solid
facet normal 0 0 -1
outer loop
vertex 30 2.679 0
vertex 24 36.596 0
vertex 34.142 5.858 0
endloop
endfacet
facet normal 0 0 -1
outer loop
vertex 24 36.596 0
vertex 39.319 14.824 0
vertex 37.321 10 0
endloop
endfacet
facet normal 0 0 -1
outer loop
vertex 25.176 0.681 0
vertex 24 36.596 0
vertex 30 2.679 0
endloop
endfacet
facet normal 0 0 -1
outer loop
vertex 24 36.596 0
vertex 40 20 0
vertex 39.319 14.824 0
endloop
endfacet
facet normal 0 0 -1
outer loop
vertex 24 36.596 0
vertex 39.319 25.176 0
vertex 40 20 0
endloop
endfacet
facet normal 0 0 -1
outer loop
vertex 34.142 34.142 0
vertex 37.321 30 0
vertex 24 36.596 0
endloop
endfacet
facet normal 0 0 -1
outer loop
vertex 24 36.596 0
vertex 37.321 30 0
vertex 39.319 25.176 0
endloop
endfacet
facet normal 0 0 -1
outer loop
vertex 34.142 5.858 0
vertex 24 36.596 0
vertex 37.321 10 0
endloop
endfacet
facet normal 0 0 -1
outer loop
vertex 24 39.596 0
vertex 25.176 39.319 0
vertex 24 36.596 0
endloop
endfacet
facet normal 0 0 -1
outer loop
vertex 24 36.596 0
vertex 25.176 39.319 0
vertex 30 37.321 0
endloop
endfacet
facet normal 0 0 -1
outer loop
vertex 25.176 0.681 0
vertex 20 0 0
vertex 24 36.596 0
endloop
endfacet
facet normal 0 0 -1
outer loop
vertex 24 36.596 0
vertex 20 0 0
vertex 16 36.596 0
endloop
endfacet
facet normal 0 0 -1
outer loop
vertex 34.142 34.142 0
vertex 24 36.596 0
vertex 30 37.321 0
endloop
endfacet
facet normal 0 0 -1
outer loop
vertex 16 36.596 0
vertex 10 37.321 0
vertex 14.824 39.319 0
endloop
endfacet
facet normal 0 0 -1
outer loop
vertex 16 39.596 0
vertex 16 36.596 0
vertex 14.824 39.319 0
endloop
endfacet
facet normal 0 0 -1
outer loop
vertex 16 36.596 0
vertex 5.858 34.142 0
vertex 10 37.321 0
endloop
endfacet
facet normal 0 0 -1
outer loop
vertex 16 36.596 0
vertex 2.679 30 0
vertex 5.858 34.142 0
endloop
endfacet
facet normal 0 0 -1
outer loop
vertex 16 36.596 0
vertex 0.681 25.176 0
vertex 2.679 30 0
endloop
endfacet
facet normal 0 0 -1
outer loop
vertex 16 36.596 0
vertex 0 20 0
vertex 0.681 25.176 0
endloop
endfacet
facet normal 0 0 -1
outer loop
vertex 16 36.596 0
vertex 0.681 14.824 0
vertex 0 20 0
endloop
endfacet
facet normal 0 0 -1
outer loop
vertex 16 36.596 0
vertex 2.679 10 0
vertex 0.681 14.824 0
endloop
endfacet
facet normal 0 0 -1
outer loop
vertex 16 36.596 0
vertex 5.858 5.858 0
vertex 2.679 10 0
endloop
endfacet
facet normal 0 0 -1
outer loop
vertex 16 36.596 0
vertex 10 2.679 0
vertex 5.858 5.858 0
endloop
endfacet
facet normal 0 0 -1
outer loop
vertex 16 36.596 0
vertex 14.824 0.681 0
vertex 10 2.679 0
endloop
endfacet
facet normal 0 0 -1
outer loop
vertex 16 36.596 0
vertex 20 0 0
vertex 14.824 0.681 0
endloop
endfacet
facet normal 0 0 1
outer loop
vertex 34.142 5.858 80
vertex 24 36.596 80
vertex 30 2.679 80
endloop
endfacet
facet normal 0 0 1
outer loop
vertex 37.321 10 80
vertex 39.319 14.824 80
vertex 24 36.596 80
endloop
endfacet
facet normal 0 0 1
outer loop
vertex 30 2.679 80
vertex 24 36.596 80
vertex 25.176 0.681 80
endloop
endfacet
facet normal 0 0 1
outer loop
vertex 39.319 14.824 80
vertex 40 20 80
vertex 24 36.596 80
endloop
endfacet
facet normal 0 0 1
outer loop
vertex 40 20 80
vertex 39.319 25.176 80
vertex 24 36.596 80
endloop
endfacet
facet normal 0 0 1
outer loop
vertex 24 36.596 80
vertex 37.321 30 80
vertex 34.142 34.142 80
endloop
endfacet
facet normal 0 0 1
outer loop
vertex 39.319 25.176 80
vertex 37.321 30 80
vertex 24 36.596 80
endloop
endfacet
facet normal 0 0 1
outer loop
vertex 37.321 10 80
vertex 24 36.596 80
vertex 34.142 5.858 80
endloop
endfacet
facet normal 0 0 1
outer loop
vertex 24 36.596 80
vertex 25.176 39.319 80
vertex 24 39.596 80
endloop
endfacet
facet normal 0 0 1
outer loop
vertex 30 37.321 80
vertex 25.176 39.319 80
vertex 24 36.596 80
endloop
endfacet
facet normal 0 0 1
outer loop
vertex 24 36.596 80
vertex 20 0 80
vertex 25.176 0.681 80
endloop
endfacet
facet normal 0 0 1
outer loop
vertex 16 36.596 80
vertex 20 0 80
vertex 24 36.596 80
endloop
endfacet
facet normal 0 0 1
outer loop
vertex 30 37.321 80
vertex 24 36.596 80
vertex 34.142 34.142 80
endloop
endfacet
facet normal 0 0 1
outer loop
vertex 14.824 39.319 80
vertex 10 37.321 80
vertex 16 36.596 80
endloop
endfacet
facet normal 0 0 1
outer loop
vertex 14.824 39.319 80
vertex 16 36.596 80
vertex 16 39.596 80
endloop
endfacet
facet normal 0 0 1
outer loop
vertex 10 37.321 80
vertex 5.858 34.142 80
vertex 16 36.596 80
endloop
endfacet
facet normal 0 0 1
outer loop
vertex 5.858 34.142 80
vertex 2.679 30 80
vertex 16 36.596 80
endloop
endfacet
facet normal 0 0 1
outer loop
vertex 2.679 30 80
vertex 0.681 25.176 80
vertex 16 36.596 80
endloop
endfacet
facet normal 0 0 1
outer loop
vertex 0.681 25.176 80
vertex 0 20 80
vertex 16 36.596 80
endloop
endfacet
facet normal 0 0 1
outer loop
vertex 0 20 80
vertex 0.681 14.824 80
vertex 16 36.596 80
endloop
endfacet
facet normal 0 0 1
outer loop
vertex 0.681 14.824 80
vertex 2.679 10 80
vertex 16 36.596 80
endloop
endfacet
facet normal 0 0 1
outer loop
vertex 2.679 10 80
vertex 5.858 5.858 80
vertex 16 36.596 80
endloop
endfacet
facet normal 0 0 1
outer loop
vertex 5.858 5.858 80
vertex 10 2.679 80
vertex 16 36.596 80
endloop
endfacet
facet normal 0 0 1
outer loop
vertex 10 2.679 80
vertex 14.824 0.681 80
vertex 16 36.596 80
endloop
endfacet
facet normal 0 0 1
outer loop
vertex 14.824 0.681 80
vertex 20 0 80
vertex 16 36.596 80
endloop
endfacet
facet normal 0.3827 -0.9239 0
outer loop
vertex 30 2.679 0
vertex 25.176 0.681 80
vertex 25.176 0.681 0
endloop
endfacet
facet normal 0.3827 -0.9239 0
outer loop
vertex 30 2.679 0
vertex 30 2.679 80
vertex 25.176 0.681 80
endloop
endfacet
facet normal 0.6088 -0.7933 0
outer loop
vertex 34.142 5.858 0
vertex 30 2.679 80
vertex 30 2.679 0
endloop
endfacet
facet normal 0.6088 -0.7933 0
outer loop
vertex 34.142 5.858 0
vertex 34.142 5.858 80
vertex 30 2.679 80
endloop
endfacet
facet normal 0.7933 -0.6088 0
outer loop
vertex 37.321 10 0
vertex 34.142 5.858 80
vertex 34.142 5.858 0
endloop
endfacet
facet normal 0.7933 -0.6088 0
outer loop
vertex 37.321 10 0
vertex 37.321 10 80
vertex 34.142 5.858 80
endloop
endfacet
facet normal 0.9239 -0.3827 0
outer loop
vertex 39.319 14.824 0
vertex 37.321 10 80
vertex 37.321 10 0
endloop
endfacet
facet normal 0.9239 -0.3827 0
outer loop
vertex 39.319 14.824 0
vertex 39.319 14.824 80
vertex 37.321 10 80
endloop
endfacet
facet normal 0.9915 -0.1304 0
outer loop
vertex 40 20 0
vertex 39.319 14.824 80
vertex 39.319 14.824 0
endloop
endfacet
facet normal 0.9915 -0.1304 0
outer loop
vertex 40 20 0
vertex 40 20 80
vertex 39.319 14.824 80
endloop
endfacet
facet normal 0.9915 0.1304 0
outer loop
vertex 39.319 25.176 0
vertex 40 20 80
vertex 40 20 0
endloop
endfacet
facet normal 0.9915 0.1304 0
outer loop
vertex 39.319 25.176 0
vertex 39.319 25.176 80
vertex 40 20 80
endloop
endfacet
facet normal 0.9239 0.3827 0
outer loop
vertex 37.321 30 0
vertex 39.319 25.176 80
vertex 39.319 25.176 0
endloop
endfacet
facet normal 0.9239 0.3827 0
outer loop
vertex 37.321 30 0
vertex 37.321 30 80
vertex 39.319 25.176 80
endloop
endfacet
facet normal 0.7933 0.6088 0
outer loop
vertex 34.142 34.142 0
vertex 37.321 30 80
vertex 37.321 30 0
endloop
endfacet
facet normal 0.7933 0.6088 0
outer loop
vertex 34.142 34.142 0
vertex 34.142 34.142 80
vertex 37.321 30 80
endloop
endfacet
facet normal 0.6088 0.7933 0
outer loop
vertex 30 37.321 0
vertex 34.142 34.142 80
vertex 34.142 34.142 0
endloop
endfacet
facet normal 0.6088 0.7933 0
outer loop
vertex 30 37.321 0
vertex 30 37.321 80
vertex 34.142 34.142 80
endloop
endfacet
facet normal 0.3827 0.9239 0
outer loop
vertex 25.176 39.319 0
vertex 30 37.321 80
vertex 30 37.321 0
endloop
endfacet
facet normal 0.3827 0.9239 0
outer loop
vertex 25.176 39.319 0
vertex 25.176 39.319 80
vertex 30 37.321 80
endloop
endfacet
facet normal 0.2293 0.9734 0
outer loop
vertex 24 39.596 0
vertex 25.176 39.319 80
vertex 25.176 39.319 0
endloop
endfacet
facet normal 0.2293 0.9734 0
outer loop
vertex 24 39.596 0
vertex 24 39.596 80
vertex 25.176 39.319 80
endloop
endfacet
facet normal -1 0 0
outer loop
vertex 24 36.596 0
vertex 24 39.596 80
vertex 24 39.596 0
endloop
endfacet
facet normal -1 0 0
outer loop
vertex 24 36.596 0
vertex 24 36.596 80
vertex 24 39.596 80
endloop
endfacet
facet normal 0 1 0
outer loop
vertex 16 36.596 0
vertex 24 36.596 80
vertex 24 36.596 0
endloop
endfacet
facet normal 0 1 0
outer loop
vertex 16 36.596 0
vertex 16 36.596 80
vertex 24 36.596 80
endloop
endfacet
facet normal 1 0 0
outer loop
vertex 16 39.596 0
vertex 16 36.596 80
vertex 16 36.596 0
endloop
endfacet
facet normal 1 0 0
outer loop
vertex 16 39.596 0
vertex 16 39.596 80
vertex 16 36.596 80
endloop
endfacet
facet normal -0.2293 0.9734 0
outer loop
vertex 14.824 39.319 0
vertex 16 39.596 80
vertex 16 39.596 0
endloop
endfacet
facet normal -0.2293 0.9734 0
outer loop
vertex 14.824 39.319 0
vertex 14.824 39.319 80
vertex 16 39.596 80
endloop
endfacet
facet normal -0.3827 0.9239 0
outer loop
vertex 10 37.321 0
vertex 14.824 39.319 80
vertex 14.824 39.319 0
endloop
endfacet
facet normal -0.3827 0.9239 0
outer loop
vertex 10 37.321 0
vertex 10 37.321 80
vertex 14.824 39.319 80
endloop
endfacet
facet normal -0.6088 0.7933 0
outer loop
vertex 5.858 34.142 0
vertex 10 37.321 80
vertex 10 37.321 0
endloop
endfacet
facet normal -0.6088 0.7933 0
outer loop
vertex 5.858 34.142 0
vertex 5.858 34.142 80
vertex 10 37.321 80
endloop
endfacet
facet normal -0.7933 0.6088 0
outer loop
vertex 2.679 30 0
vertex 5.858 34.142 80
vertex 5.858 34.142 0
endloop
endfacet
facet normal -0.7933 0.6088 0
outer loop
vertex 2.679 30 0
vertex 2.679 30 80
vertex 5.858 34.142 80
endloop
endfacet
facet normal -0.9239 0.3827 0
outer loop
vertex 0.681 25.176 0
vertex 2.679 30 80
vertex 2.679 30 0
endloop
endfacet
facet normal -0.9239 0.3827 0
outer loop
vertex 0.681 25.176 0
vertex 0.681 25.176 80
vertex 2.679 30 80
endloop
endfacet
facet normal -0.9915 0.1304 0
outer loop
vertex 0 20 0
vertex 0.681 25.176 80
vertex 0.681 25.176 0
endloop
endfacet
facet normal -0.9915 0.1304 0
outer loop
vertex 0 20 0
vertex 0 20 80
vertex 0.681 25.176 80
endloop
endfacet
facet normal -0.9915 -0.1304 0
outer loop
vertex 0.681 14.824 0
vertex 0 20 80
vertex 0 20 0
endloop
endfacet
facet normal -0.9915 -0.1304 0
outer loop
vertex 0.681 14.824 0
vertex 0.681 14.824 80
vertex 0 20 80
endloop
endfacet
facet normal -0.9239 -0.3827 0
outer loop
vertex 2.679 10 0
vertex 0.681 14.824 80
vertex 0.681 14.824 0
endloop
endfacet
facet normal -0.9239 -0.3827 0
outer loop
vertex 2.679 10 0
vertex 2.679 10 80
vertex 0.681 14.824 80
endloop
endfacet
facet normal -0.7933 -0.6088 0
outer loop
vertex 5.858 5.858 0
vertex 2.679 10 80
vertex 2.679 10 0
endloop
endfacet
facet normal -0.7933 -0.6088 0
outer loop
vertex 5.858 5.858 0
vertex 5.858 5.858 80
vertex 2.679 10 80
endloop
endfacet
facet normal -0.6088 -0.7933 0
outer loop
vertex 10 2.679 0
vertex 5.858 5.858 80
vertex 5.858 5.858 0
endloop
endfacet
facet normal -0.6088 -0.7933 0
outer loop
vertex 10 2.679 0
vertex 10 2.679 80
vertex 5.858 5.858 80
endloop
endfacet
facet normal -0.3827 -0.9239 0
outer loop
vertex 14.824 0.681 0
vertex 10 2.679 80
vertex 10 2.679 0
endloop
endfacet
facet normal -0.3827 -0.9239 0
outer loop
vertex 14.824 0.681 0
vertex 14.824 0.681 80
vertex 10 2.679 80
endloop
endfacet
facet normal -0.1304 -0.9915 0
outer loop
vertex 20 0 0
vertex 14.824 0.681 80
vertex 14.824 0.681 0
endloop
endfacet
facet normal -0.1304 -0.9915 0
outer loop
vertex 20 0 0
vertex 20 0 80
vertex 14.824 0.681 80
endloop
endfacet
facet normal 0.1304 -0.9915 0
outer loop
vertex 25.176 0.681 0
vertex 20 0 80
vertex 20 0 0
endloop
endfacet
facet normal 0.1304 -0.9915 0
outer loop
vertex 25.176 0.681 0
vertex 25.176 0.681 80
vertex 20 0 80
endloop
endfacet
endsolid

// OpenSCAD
$fn = 32;

// ----------------------------------------------------------------------
// Keyway shaft: d40 shaft, key 8 x 3 mm
// ----------------------------------------------------------------------

// --- parameters (mm) ---
shaft_r = 20;             // shaft radius
key_w = 8;                // keyway width
key_d = 3;                // keyway depth below the surface line
plate_t = 80;             // shaft length, Z (extrusion height)

shaft_d = 2 * shaft_r;  // shaft diameter
circle_step = 15;  // polygon sampling step, degrees

profile = [[14.824, 39.319], [10, 37.321], [5.858, 34.142], [2.679, 30], [0.681, 25.176], [0, 20], [0.681, 14.824], [2.679, 10], [5.858, 5.858], [10, 2.679], [14.824, 0.681], [20, 0], [25.176, 0.681], [30, 2.679], [34.142, 5.858], [37.321, 10], [39.319, 14.824], [40, 20], [39.319, 25.176], [37.321, 30], [34.142, 34.142], [30, 37.321], [25.176, 39.319], [24, 39.596], [24, 36.596], [16, 36.596], [16, 39.596]];  // primary outline, 27 points, counter clockwise

// --- the one profile operation ---
linear_extrude(height = plate_t) polygon(points = profile);
